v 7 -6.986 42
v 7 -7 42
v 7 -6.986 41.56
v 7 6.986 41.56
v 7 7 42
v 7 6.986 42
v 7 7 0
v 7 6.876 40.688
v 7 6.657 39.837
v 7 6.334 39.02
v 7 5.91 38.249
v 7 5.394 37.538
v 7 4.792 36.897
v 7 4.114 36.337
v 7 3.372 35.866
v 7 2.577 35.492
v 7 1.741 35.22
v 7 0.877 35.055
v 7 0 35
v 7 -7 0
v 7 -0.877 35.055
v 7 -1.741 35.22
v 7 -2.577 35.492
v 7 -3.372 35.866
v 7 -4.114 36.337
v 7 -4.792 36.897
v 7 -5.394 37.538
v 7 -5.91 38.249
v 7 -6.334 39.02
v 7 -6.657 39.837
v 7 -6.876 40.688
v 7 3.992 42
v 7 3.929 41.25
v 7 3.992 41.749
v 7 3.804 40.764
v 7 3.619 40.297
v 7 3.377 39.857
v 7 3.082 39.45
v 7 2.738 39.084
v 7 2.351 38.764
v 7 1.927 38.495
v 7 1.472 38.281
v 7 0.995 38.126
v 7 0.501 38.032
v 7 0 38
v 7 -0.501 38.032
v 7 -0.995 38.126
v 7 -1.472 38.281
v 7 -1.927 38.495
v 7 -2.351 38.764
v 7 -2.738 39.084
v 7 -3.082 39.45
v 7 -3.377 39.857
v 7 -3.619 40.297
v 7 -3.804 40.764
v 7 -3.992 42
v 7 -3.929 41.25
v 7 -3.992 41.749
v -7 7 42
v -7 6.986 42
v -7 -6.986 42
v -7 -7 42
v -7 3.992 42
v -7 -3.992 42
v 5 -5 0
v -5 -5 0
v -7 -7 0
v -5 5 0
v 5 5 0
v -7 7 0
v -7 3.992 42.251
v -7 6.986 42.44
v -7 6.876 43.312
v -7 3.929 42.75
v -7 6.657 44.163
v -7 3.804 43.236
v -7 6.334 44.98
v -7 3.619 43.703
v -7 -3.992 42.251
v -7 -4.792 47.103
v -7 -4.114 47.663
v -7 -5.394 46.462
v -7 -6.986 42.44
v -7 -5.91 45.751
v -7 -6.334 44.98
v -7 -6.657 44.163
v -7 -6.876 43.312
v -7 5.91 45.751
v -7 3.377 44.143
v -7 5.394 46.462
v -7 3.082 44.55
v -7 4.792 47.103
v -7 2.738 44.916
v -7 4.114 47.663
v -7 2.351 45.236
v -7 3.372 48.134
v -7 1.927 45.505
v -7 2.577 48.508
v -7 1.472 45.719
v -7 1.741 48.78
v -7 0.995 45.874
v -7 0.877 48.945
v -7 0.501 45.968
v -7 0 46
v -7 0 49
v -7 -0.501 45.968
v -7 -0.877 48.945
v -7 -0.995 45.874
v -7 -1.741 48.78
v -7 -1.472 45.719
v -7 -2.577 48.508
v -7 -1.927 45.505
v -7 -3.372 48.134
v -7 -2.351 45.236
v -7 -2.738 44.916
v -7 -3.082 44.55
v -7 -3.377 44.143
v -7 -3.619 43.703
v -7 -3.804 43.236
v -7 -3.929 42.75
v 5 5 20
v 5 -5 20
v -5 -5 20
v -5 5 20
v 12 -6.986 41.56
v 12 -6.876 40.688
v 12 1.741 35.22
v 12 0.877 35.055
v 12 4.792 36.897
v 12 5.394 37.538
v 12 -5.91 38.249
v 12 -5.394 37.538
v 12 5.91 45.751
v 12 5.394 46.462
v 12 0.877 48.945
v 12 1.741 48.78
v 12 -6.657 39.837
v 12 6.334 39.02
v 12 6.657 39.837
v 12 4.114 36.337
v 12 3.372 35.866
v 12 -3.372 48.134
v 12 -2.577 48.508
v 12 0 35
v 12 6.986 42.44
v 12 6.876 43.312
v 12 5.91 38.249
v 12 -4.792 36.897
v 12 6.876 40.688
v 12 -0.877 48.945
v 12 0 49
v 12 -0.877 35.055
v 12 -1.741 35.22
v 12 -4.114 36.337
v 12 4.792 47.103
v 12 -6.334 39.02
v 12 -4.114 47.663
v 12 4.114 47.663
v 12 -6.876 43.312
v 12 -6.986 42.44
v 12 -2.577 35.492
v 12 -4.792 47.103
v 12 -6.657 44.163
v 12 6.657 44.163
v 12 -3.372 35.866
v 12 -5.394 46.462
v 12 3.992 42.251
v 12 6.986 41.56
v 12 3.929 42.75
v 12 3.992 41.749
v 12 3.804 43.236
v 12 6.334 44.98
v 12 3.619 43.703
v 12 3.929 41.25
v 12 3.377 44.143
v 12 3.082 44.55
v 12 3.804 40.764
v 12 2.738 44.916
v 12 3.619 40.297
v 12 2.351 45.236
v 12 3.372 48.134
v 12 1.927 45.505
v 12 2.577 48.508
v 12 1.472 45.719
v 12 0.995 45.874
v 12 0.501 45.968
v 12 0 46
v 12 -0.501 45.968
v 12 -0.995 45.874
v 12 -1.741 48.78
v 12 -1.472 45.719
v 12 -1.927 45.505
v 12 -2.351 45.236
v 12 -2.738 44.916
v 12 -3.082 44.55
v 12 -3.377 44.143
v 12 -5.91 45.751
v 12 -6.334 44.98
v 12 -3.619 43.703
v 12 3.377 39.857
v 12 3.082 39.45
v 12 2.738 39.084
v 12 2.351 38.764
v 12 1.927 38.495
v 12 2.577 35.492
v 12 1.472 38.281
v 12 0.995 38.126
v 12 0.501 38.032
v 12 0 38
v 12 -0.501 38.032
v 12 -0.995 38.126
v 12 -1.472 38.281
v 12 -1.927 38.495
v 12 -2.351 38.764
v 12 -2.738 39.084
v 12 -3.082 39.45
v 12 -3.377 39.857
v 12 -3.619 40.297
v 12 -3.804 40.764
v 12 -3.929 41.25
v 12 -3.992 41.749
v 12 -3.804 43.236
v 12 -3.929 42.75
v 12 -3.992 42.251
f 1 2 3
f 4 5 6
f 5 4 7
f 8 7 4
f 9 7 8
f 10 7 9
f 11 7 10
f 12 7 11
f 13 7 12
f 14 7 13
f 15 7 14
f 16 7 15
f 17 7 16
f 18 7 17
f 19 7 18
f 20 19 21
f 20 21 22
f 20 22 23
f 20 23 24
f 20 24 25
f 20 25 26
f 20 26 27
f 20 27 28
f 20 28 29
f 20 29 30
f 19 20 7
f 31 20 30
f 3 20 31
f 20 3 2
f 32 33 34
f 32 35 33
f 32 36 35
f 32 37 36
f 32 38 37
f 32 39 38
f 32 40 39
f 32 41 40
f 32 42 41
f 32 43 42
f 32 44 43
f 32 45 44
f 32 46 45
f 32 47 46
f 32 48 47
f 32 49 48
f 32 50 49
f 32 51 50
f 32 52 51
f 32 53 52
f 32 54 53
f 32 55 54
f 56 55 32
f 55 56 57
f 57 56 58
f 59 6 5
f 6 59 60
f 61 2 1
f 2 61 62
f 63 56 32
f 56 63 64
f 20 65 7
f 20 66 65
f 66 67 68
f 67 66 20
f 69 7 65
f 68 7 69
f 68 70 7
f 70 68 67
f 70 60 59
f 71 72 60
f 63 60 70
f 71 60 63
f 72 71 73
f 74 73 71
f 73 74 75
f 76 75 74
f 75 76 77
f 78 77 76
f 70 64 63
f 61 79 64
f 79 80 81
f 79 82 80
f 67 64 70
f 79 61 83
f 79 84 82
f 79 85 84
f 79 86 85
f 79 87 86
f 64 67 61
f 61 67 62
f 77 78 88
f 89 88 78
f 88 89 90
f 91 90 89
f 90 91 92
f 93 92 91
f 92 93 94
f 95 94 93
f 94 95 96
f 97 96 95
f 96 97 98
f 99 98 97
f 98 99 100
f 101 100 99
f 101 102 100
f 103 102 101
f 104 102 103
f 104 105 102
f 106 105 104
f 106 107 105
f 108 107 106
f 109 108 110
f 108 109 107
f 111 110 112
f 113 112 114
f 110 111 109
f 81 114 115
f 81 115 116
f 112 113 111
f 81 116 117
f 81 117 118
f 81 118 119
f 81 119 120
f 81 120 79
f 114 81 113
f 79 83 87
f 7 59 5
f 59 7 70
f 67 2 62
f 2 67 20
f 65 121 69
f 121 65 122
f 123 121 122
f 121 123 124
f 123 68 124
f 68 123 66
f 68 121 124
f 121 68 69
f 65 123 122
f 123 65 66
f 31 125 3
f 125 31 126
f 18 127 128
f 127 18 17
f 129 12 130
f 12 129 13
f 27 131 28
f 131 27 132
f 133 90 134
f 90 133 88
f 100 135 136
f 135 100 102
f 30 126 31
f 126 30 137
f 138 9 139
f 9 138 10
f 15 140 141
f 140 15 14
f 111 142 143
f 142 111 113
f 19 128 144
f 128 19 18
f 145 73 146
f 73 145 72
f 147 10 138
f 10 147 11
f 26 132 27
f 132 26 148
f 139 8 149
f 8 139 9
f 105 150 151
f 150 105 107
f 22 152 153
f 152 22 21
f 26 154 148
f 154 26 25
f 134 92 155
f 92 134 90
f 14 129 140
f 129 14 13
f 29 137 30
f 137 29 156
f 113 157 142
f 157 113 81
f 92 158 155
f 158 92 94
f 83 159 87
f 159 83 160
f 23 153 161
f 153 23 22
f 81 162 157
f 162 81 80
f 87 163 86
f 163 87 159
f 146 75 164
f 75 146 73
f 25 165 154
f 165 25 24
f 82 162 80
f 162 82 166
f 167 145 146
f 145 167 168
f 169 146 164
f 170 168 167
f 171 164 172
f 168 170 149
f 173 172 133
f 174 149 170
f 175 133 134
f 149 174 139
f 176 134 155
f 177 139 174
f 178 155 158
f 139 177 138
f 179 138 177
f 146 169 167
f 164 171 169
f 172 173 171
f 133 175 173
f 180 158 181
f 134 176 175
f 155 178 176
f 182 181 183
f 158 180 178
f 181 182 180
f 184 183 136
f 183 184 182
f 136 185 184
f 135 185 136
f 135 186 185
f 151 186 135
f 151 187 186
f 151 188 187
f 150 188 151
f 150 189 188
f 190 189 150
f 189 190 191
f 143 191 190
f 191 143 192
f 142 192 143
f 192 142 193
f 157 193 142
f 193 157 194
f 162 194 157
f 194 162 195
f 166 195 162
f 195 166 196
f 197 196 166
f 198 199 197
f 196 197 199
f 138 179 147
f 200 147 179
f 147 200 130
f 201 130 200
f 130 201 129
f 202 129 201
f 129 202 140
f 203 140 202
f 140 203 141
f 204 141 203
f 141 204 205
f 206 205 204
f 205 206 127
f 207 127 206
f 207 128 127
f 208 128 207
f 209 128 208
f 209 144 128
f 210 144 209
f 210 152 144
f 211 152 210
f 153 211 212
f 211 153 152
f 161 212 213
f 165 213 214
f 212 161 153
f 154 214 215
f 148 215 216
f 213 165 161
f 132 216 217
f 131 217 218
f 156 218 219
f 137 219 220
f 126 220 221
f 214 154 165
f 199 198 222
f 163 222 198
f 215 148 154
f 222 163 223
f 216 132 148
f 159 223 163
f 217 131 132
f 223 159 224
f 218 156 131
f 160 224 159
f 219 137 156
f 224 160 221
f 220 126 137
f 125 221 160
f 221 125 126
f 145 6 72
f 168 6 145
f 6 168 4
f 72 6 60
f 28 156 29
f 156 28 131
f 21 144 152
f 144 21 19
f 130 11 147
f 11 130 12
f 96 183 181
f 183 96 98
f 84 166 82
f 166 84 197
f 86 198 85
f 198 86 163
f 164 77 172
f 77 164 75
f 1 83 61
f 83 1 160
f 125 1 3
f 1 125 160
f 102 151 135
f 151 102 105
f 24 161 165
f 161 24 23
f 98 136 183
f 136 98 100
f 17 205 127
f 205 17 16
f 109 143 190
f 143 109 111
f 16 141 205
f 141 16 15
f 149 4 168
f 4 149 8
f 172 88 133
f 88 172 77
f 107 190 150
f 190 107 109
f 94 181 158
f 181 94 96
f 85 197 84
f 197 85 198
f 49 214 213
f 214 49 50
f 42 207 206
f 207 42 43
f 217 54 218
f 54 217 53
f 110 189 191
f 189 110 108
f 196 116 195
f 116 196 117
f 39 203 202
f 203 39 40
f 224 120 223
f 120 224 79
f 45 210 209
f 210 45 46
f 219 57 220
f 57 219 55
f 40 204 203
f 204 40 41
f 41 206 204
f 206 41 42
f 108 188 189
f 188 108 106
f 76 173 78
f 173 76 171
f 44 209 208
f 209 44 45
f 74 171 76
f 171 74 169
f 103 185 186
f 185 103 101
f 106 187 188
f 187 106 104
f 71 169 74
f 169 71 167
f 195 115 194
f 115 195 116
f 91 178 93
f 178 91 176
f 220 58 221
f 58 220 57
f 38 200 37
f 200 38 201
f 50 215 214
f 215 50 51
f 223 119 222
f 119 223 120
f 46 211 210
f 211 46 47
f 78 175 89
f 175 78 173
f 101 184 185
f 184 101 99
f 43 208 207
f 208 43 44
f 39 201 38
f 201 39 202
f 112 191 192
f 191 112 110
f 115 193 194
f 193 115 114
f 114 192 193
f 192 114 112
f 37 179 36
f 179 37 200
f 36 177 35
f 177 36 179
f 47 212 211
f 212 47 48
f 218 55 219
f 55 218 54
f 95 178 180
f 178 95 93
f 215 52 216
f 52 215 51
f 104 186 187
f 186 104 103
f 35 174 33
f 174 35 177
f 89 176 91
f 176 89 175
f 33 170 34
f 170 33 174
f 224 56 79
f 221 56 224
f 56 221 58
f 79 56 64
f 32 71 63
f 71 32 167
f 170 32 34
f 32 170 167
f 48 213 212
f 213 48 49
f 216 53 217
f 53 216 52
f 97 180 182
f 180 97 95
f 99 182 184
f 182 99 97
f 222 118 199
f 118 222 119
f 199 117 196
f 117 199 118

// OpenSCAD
$fn=50;
armX=10;
socketX=armX+4;

module armmount1() {
	difference() {
		translate([-socketX/2,-socketX/2,0])cube([socketX,socketX,3*socketX]);
		translate([-armX/2,-armX/2,0])cube([armX,armX,2*armX]);
	}
	difference() {
		translate([-socketX/2,0,3*socketX])rotate([0,90,0])cylinder(r=socketX/2,h=19);
		translate([-socketX/2,0,3*socketX])rotate([0,90,0])cylinder(r=4,h=19);
	}
}

armmount1();
